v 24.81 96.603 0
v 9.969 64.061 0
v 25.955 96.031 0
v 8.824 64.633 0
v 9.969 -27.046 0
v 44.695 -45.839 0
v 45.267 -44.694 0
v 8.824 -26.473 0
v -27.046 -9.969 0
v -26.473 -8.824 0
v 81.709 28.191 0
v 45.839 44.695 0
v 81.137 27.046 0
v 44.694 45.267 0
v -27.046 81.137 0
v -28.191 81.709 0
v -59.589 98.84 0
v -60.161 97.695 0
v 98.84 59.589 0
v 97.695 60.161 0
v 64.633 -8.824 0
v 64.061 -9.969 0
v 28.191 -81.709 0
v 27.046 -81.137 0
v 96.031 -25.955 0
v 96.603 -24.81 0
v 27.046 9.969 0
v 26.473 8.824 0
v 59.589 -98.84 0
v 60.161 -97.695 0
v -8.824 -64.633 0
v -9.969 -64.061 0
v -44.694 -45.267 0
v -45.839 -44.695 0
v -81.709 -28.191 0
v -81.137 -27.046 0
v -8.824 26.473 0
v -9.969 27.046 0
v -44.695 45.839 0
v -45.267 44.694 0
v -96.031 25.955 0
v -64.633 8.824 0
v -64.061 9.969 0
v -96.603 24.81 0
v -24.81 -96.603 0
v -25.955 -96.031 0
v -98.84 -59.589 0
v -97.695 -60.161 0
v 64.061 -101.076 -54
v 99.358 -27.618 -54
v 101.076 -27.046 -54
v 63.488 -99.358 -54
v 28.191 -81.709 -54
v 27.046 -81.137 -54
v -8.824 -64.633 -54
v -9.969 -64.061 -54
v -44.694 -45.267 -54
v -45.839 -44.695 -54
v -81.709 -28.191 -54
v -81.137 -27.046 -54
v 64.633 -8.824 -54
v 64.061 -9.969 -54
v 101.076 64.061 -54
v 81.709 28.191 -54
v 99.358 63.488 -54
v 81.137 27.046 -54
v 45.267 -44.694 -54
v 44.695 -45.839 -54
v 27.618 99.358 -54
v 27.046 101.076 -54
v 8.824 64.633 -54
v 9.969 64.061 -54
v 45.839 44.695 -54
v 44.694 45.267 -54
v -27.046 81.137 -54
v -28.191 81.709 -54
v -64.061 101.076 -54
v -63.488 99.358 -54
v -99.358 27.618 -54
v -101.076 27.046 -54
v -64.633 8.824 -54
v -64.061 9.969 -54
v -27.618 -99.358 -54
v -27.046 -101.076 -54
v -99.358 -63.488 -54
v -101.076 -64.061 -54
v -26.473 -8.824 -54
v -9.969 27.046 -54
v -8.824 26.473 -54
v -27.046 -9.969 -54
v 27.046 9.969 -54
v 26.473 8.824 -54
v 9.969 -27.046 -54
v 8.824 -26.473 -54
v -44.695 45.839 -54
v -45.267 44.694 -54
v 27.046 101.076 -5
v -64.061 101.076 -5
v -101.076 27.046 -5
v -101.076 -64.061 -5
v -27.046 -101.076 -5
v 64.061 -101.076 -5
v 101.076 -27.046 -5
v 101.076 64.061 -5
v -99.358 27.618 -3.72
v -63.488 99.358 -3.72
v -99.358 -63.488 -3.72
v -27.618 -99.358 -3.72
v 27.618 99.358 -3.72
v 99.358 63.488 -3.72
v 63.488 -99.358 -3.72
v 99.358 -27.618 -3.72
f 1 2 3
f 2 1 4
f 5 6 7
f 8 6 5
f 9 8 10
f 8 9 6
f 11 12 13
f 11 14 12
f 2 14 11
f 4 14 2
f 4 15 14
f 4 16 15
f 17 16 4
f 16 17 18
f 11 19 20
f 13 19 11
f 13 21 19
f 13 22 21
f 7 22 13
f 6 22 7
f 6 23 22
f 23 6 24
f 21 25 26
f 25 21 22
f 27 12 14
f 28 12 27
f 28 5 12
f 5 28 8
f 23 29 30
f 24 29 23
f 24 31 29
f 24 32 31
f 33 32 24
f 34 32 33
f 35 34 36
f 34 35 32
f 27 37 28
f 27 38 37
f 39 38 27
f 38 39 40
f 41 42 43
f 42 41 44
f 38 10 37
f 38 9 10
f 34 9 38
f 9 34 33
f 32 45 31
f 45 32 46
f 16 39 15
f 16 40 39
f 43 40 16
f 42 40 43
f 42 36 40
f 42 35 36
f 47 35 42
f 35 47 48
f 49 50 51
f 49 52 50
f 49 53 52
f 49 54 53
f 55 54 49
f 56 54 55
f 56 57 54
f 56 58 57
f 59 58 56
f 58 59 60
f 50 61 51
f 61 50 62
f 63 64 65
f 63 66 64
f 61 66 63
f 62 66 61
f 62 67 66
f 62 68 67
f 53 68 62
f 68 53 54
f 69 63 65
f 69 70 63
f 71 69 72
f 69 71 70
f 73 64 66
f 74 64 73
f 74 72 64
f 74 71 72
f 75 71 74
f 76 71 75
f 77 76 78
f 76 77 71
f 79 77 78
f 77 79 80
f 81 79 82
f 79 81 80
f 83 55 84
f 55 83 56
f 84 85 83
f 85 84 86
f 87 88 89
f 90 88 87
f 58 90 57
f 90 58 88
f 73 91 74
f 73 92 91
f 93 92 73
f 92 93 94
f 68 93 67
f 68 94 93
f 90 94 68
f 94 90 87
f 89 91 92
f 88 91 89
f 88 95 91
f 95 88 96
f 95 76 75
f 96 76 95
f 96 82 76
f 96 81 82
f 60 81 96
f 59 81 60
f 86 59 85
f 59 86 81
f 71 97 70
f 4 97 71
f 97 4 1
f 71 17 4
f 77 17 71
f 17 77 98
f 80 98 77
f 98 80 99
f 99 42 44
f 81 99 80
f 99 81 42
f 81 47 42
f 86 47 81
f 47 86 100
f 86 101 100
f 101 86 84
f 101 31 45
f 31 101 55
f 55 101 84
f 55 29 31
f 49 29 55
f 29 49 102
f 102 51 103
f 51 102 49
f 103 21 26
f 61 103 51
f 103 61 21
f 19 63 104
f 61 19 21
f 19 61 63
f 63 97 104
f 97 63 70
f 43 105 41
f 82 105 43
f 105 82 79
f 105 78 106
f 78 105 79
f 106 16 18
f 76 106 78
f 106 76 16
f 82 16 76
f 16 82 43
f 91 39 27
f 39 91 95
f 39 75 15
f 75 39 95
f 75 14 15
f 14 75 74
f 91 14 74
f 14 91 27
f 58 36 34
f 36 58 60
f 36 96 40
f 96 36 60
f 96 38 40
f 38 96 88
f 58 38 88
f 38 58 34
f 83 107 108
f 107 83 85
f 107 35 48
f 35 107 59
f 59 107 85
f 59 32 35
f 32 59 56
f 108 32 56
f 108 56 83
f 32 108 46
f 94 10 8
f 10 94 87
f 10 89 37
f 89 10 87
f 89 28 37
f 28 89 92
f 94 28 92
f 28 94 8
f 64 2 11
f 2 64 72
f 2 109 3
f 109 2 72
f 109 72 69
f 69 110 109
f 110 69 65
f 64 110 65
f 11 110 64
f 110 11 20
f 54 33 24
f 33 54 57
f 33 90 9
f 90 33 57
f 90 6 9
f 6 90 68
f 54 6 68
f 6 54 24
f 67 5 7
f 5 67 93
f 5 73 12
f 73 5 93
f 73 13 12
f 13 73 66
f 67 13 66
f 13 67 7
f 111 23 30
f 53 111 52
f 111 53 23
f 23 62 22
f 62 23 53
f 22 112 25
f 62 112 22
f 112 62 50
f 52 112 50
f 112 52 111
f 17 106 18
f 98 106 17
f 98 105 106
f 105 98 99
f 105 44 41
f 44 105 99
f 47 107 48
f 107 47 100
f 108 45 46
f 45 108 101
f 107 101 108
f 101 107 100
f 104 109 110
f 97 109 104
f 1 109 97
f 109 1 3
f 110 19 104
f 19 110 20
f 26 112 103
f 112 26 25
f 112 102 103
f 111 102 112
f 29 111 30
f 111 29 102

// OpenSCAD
width = 205;
thickness = 1.28;
height = 54;

// I probably could have done this in 2d but whatever
// now i have to do this in 2d so i can chamfer whee
unit = (width - thickness) / 5;


module rectangle() {
  difference() {
    offset(delta = thickness / 2) square([1, 2] * unit, center = true);
    offset(delta = - thickness / 2) square([1, 2] * unit, center = true);
  }
}
module shadow() {
  for (th = [0, 90, 180, 270]) {
    rotate(th) {
      translate([1, .5] * unit) rectangle();
      translate([2, - .5] * unit) rectangle();
    }
  }
}

module chube(d, t){
    hull(){
       cube([d,    d-2*t,d-2*t], center=true);
       cube([d-2*t,d,    d-2*t], center=true);
       cube([d-2*t,d-2*t,d    ], center=true);
    }
}

module main(){
  render() intersection(){
    linear_extrude(height)shadow();
    translate([0,0,width/2]) chube(width, 5);
  }
}
if($preview){
  main();
} else {
  //optimal print orientation
  rotate(atan(2)) mirror([0,0,1]) main();
}
